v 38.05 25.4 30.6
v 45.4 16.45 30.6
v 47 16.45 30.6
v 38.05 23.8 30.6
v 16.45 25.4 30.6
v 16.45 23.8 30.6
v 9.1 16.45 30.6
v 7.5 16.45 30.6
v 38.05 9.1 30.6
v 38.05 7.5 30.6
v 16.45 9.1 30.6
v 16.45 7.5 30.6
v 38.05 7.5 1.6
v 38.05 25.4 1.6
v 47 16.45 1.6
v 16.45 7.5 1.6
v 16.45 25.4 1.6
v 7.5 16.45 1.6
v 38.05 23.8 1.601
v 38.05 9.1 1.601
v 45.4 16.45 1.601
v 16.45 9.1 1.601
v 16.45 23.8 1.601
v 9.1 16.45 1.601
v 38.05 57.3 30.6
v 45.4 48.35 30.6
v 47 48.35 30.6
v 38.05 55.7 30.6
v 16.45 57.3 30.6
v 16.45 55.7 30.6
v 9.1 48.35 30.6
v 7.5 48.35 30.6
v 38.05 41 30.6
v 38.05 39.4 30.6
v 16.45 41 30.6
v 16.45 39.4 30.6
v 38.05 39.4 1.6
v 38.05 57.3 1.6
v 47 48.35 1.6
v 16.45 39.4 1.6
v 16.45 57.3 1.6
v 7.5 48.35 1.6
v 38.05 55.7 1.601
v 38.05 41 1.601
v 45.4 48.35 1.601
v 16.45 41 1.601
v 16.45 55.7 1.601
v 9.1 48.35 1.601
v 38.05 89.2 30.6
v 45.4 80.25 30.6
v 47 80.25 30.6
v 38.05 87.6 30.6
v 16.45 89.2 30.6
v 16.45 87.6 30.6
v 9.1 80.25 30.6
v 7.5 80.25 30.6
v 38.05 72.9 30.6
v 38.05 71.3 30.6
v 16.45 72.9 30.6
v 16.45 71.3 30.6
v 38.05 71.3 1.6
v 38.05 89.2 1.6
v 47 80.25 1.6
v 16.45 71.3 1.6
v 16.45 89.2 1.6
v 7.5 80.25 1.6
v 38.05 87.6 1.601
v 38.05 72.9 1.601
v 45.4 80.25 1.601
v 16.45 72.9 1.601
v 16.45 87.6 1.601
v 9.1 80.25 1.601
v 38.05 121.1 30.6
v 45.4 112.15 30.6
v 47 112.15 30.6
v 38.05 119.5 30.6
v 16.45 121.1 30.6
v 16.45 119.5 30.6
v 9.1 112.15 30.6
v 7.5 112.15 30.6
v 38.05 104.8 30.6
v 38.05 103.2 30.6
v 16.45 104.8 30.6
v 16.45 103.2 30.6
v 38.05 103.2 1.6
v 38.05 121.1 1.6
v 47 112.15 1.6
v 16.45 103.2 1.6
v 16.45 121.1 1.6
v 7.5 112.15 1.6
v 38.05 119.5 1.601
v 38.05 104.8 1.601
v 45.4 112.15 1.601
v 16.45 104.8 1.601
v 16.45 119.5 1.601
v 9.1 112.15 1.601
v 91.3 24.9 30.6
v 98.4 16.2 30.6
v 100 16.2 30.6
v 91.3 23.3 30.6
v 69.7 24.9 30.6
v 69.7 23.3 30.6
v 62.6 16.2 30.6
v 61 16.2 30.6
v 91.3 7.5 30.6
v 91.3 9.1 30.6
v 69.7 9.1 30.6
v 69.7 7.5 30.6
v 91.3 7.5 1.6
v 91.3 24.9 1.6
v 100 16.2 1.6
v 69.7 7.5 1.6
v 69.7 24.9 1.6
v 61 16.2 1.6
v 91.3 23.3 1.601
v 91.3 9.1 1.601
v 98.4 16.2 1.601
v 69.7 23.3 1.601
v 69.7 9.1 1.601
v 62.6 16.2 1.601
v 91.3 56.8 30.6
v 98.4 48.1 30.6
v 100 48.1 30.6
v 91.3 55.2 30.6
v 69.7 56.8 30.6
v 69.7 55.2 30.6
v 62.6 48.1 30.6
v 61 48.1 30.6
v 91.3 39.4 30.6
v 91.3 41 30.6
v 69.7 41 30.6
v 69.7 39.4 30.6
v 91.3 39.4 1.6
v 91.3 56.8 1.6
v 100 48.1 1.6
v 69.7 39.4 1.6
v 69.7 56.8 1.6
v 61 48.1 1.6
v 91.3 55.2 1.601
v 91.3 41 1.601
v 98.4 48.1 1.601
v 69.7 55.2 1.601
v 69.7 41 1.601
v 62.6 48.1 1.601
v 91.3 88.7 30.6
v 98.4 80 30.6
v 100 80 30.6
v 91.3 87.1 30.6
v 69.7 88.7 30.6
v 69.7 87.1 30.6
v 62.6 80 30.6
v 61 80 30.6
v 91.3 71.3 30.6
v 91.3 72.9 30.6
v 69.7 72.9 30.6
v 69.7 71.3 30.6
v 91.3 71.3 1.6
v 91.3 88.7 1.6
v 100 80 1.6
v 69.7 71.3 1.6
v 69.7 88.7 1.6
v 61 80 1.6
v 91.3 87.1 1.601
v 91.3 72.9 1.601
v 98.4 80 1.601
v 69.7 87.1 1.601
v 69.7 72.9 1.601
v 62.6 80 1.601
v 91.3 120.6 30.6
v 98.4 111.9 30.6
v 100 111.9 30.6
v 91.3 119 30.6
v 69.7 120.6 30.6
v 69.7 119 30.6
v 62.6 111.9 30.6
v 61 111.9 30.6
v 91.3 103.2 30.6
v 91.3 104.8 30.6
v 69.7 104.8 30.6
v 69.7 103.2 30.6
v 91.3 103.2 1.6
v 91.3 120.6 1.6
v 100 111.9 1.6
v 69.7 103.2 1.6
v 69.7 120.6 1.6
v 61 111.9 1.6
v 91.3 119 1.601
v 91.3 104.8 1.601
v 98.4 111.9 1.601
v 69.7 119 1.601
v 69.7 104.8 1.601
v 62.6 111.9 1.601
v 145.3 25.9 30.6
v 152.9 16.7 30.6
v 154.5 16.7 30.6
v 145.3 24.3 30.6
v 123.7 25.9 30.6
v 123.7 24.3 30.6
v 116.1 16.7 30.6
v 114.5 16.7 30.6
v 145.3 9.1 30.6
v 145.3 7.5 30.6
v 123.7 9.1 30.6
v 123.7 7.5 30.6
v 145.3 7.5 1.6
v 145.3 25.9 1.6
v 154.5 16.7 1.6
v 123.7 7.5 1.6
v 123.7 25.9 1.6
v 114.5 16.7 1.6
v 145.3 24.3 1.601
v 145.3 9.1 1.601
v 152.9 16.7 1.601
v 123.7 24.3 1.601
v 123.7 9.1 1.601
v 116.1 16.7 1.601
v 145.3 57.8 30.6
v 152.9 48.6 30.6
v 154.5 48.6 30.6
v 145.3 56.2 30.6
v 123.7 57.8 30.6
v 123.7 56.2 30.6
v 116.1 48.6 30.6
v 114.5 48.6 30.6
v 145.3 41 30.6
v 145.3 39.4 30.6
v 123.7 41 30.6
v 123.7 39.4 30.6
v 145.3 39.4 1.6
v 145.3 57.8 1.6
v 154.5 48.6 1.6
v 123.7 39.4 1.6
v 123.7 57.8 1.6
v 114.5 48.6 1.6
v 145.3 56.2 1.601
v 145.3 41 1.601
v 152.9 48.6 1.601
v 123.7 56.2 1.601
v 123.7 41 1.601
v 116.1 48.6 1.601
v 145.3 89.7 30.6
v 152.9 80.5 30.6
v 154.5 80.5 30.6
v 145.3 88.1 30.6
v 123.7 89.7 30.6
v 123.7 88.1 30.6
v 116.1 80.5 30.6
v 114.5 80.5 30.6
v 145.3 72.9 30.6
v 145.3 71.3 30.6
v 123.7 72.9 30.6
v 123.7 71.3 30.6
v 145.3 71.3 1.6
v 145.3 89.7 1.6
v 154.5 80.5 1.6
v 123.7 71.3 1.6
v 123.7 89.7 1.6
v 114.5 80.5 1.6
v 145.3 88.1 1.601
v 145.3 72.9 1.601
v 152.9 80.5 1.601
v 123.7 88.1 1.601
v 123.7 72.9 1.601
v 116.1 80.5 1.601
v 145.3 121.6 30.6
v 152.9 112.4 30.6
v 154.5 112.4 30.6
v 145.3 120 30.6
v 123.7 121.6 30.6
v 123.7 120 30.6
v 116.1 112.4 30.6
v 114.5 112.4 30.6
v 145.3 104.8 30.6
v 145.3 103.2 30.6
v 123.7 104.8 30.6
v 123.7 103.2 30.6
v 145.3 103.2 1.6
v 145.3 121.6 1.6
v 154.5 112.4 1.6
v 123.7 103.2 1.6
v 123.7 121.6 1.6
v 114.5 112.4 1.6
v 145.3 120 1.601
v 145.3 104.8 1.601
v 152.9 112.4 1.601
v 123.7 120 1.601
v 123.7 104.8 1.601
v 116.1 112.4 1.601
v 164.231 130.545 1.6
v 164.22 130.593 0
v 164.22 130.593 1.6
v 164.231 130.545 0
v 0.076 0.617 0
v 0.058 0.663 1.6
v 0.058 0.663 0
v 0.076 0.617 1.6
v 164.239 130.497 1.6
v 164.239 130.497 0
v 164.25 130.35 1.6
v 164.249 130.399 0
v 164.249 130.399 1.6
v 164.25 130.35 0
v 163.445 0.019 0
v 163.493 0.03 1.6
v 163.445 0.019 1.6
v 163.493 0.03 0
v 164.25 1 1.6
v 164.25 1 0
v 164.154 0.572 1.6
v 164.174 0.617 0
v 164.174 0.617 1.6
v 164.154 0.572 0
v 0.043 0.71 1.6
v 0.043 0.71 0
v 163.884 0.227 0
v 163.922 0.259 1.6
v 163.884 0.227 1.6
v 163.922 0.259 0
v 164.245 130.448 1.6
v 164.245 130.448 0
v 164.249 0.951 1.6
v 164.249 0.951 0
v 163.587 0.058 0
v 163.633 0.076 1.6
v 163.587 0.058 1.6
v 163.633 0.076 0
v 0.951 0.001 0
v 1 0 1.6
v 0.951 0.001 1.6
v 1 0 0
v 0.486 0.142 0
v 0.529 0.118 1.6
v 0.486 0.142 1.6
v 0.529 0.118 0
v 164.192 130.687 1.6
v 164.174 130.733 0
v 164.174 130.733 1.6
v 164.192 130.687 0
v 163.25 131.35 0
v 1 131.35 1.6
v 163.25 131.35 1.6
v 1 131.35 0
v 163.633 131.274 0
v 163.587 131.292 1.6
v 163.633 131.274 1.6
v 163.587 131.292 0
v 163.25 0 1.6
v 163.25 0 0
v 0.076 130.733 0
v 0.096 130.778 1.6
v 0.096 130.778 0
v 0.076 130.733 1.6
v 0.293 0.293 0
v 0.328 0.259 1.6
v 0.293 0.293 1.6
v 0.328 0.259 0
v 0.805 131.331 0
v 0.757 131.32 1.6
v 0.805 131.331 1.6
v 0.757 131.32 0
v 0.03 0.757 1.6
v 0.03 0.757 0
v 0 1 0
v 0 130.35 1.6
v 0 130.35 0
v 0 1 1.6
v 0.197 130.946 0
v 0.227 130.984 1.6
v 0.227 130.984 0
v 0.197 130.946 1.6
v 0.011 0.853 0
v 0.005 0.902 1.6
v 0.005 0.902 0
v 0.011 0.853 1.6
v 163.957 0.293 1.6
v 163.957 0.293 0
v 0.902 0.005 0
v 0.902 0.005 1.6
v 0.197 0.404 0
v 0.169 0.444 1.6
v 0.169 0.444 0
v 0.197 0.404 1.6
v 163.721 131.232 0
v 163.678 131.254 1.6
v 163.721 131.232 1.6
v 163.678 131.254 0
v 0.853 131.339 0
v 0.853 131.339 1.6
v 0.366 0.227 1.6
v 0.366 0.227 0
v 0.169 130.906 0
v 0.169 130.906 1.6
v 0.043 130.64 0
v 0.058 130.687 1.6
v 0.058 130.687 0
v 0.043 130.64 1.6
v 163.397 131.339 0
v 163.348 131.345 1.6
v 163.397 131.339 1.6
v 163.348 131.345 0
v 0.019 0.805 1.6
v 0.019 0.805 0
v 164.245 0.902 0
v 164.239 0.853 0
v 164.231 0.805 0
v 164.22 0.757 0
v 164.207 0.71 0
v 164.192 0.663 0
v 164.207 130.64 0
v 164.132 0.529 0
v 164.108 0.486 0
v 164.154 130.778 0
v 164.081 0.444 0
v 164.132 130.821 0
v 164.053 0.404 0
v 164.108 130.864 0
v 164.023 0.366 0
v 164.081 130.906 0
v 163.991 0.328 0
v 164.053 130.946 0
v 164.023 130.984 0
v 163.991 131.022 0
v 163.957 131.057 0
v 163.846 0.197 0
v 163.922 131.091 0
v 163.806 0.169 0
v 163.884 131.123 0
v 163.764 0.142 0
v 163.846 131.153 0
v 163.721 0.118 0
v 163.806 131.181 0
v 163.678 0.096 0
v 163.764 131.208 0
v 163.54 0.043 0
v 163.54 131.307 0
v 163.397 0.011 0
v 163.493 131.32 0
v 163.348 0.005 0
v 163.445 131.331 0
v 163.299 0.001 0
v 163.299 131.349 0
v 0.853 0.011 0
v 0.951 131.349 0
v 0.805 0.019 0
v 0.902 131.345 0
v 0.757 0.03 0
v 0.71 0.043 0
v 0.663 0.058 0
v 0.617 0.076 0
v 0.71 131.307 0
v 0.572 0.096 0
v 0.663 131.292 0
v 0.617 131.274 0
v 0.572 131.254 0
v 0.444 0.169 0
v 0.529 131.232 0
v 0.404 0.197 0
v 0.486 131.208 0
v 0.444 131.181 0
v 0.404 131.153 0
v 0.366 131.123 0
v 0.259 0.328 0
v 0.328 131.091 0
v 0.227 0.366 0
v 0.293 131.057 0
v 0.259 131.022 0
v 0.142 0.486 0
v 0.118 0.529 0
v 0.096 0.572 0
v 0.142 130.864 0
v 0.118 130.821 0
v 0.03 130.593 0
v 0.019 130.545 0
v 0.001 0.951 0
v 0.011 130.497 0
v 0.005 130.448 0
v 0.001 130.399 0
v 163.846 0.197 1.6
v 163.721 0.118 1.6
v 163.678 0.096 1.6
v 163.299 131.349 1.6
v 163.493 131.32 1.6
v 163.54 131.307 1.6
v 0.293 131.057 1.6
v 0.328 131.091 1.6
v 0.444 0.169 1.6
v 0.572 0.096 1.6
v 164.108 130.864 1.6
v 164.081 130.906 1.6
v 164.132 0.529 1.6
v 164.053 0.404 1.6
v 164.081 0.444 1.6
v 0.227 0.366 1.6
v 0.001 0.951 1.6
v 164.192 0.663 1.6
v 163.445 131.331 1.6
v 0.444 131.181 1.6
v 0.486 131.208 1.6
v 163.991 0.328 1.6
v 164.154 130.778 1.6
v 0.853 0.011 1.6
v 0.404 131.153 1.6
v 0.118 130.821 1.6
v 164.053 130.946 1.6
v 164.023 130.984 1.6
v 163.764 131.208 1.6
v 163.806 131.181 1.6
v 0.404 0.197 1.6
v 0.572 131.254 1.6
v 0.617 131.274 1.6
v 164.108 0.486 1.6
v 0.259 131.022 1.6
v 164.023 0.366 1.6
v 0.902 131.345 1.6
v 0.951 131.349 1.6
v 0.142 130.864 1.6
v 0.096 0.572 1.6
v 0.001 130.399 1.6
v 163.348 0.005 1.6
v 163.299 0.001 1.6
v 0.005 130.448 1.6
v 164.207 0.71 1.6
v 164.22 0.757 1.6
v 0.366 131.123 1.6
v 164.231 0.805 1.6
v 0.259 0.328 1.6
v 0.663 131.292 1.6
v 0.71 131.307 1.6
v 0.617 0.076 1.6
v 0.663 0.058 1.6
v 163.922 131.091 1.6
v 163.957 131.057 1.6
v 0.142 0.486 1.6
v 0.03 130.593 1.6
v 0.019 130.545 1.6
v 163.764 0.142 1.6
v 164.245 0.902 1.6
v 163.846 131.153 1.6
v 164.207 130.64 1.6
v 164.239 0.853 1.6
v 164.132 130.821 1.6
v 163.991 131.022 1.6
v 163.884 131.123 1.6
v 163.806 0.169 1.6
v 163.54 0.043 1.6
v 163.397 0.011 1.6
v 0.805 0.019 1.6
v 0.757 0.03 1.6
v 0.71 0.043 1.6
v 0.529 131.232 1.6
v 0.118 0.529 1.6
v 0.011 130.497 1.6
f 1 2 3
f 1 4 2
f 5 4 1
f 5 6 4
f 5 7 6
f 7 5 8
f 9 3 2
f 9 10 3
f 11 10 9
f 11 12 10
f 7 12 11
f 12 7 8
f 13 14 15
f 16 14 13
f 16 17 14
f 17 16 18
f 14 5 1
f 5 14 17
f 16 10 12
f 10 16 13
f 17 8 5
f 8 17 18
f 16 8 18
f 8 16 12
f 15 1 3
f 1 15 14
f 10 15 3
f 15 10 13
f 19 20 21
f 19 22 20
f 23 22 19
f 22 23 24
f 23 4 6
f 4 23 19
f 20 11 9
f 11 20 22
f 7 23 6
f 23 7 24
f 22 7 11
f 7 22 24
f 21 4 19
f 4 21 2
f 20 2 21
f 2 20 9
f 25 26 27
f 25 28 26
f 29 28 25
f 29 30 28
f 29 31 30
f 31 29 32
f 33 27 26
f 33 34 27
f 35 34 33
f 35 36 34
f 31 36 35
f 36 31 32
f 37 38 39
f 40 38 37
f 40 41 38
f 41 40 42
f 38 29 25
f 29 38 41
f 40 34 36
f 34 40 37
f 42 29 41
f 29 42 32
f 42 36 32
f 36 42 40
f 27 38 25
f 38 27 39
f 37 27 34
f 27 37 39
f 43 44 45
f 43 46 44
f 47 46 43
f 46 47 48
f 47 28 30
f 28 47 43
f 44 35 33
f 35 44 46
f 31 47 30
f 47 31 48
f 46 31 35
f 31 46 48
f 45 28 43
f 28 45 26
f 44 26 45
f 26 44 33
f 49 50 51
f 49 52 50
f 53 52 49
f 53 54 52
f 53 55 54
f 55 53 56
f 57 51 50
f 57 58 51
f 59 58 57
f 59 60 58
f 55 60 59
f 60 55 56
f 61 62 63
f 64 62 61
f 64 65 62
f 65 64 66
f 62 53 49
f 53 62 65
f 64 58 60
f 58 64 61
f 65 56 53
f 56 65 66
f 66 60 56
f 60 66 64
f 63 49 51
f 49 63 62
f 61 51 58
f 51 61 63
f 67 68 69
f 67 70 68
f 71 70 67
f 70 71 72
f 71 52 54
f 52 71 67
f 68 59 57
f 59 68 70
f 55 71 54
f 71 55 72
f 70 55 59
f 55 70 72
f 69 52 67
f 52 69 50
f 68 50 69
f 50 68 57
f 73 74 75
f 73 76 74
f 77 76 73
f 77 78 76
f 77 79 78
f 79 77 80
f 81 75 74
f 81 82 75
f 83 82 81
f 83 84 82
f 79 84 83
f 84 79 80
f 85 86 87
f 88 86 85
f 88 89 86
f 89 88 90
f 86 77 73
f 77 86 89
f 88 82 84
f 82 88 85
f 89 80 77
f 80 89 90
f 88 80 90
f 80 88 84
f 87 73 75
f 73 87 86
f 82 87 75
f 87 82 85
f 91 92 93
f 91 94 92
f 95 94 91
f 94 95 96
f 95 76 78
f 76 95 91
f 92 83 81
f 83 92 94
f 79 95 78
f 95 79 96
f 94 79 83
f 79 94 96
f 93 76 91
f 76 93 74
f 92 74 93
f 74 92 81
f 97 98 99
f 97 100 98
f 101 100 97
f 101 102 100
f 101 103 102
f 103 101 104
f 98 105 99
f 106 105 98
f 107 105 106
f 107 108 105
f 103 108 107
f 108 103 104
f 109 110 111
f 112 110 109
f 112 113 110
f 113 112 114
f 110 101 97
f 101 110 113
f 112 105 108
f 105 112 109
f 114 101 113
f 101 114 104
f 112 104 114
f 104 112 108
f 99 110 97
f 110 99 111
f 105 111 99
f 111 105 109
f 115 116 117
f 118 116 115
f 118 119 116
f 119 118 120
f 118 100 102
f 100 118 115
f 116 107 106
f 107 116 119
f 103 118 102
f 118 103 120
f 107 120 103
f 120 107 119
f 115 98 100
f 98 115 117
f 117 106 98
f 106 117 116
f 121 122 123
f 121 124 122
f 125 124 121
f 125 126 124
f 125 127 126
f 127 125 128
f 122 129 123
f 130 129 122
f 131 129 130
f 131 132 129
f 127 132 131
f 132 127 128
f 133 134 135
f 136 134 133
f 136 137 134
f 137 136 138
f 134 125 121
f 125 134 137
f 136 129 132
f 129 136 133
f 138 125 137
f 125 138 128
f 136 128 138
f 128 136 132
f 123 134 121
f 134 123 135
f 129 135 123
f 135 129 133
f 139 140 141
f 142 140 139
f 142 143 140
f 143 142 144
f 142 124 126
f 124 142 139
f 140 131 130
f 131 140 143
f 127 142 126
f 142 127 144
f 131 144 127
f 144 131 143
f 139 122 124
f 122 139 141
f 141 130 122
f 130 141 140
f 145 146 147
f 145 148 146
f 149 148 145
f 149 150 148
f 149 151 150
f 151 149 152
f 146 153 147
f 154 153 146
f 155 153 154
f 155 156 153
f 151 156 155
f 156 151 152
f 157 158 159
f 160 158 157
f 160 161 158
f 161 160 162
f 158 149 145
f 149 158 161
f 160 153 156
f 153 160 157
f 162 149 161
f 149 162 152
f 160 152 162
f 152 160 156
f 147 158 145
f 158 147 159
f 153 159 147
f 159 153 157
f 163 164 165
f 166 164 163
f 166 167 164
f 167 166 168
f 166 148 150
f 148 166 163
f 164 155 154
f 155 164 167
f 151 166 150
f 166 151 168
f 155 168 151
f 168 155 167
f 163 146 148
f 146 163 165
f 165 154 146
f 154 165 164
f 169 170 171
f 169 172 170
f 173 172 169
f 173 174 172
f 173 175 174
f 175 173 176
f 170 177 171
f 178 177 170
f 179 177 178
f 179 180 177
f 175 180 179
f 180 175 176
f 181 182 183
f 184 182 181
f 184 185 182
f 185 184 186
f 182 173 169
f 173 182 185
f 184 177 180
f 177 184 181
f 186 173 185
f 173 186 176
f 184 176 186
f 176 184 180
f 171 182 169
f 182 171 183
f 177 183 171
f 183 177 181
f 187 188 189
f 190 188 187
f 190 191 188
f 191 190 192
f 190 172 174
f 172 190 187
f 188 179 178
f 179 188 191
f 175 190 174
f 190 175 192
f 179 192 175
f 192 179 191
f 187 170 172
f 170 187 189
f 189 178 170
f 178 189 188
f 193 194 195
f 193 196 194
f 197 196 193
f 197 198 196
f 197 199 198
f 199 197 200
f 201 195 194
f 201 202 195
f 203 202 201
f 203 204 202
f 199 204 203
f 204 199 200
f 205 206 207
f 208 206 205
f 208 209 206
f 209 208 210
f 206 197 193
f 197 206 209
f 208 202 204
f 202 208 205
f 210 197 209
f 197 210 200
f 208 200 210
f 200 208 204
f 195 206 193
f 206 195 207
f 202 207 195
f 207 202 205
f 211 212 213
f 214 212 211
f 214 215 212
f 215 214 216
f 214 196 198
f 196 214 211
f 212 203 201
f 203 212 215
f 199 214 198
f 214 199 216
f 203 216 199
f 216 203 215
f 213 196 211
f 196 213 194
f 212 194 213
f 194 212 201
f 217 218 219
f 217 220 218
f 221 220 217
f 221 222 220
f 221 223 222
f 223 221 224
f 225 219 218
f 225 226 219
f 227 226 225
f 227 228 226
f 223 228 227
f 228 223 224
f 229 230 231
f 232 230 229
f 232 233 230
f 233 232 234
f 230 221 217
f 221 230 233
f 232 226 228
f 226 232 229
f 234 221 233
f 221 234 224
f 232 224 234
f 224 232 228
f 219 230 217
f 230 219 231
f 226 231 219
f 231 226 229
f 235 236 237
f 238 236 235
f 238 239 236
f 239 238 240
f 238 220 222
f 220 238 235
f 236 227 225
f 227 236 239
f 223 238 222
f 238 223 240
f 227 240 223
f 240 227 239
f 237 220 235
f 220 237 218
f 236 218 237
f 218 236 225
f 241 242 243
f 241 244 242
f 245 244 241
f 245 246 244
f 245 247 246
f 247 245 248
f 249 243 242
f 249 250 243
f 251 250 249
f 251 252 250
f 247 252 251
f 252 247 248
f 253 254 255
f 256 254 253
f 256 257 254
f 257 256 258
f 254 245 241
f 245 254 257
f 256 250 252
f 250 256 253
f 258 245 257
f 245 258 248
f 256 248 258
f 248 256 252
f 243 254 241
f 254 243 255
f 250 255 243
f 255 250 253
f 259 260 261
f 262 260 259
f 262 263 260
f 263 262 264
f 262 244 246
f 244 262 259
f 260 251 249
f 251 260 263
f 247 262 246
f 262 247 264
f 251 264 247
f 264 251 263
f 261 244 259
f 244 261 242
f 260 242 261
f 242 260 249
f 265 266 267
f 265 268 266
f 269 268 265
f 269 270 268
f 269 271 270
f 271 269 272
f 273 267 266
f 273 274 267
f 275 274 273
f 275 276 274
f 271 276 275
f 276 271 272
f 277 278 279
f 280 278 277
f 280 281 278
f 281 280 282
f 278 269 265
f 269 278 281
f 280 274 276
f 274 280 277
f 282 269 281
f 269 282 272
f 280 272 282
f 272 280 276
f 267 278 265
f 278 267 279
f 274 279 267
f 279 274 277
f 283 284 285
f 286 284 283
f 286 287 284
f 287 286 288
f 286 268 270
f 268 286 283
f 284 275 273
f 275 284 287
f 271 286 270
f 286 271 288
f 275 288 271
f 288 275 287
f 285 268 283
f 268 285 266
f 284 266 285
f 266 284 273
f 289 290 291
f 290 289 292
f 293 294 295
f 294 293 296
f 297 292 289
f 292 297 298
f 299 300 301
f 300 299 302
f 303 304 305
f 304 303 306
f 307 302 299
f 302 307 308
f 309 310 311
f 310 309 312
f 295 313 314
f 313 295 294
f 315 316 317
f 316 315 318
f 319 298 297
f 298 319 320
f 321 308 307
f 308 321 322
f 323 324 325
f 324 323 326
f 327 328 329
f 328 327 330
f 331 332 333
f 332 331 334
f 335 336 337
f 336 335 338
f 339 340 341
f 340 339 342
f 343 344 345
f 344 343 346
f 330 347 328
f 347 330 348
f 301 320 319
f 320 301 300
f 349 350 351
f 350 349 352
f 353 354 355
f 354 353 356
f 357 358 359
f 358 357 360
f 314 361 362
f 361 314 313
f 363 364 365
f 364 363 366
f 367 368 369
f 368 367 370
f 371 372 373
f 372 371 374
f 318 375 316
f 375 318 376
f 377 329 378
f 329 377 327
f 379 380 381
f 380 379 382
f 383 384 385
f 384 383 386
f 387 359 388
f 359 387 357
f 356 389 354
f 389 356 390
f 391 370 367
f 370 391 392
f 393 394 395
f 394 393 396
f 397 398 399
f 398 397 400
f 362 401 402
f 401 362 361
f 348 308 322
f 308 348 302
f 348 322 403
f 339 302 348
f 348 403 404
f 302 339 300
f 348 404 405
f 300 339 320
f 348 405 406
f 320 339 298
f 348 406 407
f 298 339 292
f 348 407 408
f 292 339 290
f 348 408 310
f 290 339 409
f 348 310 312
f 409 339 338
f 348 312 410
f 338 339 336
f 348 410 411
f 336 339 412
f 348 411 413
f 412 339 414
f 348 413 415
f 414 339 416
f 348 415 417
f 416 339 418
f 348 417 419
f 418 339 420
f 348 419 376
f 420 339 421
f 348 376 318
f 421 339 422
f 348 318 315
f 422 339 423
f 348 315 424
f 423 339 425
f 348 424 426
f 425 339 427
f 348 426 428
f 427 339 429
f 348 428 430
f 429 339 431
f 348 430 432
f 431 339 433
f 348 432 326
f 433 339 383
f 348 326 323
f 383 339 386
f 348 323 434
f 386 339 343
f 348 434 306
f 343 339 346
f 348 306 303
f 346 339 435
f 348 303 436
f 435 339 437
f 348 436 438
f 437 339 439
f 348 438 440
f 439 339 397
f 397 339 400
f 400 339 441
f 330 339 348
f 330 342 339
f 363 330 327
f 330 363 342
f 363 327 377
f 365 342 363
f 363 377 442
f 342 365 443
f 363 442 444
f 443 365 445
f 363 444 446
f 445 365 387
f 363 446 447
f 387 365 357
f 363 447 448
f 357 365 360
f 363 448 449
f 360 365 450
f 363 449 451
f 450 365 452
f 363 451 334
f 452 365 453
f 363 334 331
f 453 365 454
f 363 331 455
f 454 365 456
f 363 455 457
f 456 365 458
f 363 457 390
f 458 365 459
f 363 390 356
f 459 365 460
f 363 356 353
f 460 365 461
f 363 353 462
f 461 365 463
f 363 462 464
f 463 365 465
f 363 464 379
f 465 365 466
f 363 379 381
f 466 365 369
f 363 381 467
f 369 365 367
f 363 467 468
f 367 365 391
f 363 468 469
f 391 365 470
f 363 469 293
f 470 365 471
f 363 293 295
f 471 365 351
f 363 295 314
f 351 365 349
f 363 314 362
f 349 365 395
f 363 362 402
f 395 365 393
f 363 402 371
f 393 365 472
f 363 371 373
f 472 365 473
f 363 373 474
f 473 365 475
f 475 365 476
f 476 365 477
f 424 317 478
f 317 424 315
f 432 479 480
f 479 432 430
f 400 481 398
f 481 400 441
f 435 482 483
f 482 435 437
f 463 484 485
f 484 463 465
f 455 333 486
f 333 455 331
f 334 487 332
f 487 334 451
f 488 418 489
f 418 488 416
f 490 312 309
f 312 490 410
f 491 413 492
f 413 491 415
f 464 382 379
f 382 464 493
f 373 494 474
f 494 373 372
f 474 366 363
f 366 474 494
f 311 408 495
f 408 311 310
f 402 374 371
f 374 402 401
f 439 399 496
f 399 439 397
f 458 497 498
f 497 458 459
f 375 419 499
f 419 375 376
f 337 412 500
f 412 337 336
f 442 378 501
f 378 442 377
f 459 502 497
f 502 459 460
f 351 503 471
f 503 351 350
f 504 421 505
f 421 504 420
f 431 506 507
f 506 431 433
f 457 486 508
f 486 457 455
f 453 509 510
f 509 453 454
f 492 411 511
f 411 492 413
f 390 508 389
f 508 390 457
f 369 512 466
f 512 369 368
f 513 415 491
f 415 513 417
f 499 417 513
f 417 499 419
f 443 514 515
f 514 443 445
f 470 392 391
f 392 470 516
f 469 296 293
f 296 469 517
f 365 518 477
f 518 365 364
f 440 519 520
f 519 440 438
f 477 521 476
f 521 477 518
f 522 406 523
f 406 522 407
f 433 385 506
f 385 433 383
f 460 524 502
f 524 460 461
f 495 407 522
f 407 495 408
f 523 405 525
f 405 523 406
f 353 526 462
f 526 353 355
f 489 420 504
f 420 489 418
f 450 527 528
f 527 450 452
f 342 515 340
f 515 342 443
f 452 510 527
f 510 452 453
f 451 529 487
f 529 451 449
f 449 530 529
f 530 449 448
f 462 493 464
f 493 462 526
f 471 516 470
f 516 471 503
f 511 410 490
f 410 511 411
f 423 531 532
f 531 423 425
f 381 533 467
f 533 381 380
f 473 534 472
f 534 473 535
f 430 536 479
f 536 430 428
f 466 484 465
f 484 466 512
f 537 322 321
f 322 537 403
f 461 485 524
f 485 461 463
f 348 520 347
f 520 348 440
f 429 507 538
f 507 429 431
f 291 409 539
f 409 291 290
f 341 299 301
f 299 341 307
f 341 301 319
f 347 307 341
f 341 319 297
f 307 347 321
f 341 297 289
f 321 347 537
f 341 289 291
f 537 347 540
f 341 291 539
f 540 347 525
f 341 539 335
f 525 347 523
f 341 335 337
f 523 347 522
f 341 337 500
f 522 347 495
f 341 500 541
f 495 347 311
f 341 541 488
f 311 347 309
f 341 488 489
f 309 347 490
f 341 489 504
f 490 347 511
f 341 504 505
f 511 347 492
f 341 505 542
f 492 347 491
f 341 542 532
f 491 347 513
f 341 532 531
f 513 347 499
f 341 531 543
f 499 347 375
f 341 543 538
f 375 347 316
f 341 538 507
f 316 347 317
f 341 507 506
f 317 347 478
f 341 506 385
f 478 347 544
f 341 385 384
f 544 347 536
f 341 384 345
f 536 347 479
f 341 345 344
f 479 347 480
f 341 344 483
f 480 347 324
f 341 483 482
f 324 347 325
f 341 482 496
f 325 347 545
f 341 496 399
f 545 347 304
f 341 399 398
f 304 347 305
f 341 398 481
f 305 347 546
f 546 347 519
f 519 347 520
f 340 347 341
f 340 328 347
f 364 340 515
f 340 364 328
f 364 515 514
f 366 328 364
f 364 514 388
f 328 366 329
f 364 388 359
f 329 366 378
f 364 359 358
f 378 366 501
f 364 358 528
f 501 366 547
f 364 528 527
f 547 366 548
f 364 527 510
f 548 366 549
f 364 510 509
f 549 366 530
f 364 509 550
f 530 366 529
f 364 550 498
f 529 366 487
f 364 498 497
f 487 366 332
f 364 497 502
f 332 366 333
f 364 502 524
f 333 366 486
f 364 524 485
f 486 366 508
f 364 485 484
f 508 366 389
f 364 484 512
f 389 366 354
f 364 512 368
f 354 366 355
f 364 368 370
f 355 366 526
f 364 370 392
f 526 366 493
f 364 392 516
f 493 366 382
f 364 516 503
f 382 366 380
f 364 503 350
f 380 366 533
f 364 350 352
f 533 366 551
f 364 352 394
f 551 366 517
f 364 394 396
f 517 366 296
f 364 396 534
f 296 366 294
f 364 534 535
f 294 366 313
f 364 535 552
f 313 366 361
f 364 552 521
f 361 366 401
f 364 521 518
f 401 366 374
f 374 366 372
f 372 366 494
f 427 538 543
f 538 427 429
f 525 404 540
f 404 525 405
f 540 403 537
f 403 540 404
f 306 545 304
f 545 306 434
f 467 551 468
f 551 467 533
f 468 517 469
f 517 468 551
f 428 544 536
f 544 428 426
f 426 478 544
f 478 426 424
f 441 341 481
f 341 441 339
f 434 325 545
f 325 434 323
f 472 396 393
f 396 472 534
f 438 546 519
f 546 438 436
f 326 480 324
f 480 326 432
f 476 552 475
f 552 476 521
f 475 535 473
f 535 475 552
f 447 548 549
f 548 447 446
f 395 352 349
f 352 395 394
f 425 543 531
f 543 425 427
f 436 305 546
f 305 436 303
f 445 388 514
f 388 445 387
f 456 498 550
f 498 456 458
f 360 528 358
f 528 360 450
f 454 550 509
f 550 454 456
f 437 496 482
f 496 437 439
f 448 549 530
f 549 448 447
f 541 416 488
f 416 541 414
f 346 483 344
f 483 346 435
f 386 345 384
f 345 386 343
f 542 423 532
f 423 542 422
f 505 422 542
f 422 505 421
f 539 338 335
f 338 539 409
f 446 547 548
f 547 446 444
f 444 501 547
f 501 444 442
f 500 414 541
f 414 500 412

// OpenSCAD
// file: ../lib/common.scad
/* A library of common modules, functions and variables
 * used by other *.scad files in this repository
 * by Mikrotron d.o.o. 2022
 * see the project root for license
 */
 
 /****************************************************************************
  ****************************** Variables ***********************************
  ****************************************************************************/

// Extra dimension to remove wall ambiguity in preview mode, too small to make
// any difference in 3D print, but you can set it to 0 if it bothers you ;-)
ex = 0.001;

// Make rounded objects smoother, if it slows down rendering, decrease the value.
// This is a general case value, it might be overridden for some objects and
// changing this value will have no effect for these objects
$fn = 128;

// Hole dimension correction - if 3D printed holes turn out too small,
// increase the value, or decrease the value if they're too big
// Default value is 0.4 mm
hdc = 0.4;

// Some common nuts and bolts dimensions, first number is bolt diameter
// and the second one is metric nut size (wrench size). To get value for
// specific bolts and nuts use functions bolt_dia() and nut2radius(),
// passing nuts_bolts index as parameter. If you need extra values, do
// not insert them, add them to the end of list or you'll corrupt 
// existing models
nuts_bolts = [ [1.6, 3.2],  // M1.6, index = 0
               [2, 4],      // M2,   index = 1
               [2.5, 5],    // M2.5, index = 2
               [3, 5.5],    // M3,   index = 3
               [4, 7],      // M4,   index = 4
               [5, 8],      // M5,   index = 5
               [6, 10],     // M6,   index = 6
               [8, 13],     // M8,   index = 7
               [10, 16] ];  // M10,  index = 8

// Set to true to see some example models, default is false
test = false;
if (test) test_draw();

/****************************************************************************
 ******************************* Modules ************************************
 ****************************************************************************/

// Set test variable to 'true' to see examples
module test_draw() {
    offset = 10;
    // Metric nuts
    for (i = [0 : len(nuts_bolts) - 1]) {
        translate([0, i*nut2dia(i), 0]) difference() {
            cylinder(d = nut2dia(i), h = bolt2dia(i), $fn = 6);
            translate(zex()) cylinder(d = bolt2dia(i), h = bolt2dia(i) + 2*ex);
        }
    }
    // Rounded rectangle
    translate([3*offset, 0, 0]) rounded_rect(5*offset, 3*offset, 5, 3);
    // Quarter of a cylinder
    translate([3*offset, 5*offset, 0]) cylinder_quarter(offset, 2*offset);
    // Cross beams
    translate([3*offset, 8*offset, 0]) cross_beams(3*offset, 5*offset, offset/4);
}

// Draws a rounded rectangle
module rounded_rect(x, y, z, radius = 1) {
    translate([radius,radius,0]) //move origin to outer limits
	linear_extrude(height=z)
		minkowski() {
			square([x-2*radius,y-2*radius]); //keep outer dimensions given by x and y
			circle(r = radius);
		}
}

// Draws quarter of a cylinder
module cylinder_quarter(r, h){    
    difference(){
        cylinder(r=r, h=h);
        translate ([-r-ex, -r-ex, -ex]) cube([2*r + 2*ex, r + ex, h + 2*ex]);
        translate ([-r-ex, -ex, -ex]) cube([r + ex, r + ex, h + 2*ex]);
    }
}

// Draws cross beams in the ractangle with sides a and b,
// used to shorten the print time
module cross_beams(rect_a, rect_b, beam_width){
    diag = sqrt(rect_a*rect_a + rect_b*rect_b);
    rot = atan2(rect_b, rect_a);
    translate([rect_a/2, rect_b/2, beam_width/2])
    difference(){
        union(){
            rotate(rot) cube([diag, beam_width, beam_width], true);
            rotate(-rot) cube([diag, beam_width, beam_width], true);
        }
        difference(){
            cube([rect_a + 2*beam_width, rect_b + 2*beam_width, beam_width + 2*ex], true);
            cube([rect_a, rect_b, beam_width + 4*ex], true);
        }
    }
}

/****************************************************************************
 ****************************** Functions ***********************************
 ****************************************************************************/
  
// Calculates nut diameter for given bolt_nuts index,
// check bolts_nuts list for index reference
function nut2dia(index) = nuts_bolts[index][1]/cos(180/6) + hdc/2;

// Calculates bolt diameter for given bolt_nuts index,
// check bolts_nuts list for index reference
function bolt2dia(index) = nuts_bolts[index][0] + hdc/2;

// Move to -ex on z axis
function zex() = [0, 0, -ex];

// Calculates the sum of vector (array) elements for given
// vector and starting index (default is 0)
function vectorSum(vector, startAt = 0) = 
    startAt < len(vector) - 1 ? vector[startAt] + vectorSum(vector, startAt + 1) : vector[startAt];
// main file
/*
 * EU plug stand for USB chargers and adapters
 * developed by Mikrotron d.o.o. (http://mikrotron.hr).
 *
 * This program is free software: you can redistribute it and/or modify
 * it under the terms of the GNU General Public License as published by
 * the Free Software Foundation, either version 3 of the License, or
 * (at your option) any later version. See the LICENSE file at the 
 * top-level directory of this distribution for details 
 *
 * This program is distributed in the hope that it will be useful,
 * but WITHOUT ANY WARRANTY; without even the implied warranty of
 * MERCHANTABILITY or FITNESS FOR A PARTICULAR PURPOSE.  See the
 * GNU General Public License for more details.
 *
 * You should have received a copy of the GNU General Public License
 * along with this program.  If not, see <https://www.gnu.org/licenses/>.
 */
 
// Use common library
include <../lib/common.scad>;

// Global dimensions
wall = 1.6;
default_tolerance = 0.5;
plug_body_length = 35.3;
plug_body_width = 13.7;
plug_body_height = 10;
plug_length = 19;
plug_gap = 17.5;
bracket_offset = 15;
bracket_length = plug_body_length + 2*wall;
bracket_width = plug_body_width + 2*wall;
base_height = wall;

// Entry point
eu_plug_stand();

// Main module
module eu_plug_stand() {
    columns = 3; // number of columns
    rows = 4; // number of plugs in each column
    tolerances = [0.5, 0.25, 0.75]; // number of tolerances should be equal to number of columns
    
    // Draw base
    rounded_rect((bracket_length + bracket_offset)*columns + bracket_offset/4, 
                 (bracket_width + bracket_offset)*rows + bracket_offset/4, base_height);
    
    // Draw brackets
    translate([bracket_length/2 + bracket_offset/2, bracket_width/2 + bracket_offset/2, base_height]) {
        for(x = [0 : columns - 1]) {
            for(y = [0 : rows - 1]) {
                translate([(bracket_length + bracket_offset)*x, (bracket_width + bracket_offset)*y, 0])
                    plug_bracket(tolerances[x]);
            }
        }
    }
}

// Plug bracket
module plug_bracket(tolerance = default_tolerance) {
    translate([-bracket_length/2, -bracket_width/2, 0]) difference() {
        plug_body(bracket_length, bracket_width, tolerance);
        translate([wall, wall, ex]) 
            plug_body(plug_body_length, plug_body_width, tolerance);
    }
}

// EU plug body
module plug_body(length = plug_body_length, width = plug_body_width, tolerance = default_tolerance) {
    length = length + 2*tolerance;
    width = width + 2*tolerance;
    height = plug_body_height + plug_length;
    difference() {
        cube([length, width, height]);
        translate([0, width/2, -ex]) rotate(45) 
            cube([width, width, height + 2*ex]);
        translate([0, width/2, -ex]) rotate(225) 
            cube([width, width, height + 2*ex]);
        translate([length, width/2, -ex]) rotate(45) 
            cube([width, width, height + 2*ex]);
        translate([length, width/2, -ex]) rotate(225) 
            cube([width, width, height + 2*ex]);
    }
}
